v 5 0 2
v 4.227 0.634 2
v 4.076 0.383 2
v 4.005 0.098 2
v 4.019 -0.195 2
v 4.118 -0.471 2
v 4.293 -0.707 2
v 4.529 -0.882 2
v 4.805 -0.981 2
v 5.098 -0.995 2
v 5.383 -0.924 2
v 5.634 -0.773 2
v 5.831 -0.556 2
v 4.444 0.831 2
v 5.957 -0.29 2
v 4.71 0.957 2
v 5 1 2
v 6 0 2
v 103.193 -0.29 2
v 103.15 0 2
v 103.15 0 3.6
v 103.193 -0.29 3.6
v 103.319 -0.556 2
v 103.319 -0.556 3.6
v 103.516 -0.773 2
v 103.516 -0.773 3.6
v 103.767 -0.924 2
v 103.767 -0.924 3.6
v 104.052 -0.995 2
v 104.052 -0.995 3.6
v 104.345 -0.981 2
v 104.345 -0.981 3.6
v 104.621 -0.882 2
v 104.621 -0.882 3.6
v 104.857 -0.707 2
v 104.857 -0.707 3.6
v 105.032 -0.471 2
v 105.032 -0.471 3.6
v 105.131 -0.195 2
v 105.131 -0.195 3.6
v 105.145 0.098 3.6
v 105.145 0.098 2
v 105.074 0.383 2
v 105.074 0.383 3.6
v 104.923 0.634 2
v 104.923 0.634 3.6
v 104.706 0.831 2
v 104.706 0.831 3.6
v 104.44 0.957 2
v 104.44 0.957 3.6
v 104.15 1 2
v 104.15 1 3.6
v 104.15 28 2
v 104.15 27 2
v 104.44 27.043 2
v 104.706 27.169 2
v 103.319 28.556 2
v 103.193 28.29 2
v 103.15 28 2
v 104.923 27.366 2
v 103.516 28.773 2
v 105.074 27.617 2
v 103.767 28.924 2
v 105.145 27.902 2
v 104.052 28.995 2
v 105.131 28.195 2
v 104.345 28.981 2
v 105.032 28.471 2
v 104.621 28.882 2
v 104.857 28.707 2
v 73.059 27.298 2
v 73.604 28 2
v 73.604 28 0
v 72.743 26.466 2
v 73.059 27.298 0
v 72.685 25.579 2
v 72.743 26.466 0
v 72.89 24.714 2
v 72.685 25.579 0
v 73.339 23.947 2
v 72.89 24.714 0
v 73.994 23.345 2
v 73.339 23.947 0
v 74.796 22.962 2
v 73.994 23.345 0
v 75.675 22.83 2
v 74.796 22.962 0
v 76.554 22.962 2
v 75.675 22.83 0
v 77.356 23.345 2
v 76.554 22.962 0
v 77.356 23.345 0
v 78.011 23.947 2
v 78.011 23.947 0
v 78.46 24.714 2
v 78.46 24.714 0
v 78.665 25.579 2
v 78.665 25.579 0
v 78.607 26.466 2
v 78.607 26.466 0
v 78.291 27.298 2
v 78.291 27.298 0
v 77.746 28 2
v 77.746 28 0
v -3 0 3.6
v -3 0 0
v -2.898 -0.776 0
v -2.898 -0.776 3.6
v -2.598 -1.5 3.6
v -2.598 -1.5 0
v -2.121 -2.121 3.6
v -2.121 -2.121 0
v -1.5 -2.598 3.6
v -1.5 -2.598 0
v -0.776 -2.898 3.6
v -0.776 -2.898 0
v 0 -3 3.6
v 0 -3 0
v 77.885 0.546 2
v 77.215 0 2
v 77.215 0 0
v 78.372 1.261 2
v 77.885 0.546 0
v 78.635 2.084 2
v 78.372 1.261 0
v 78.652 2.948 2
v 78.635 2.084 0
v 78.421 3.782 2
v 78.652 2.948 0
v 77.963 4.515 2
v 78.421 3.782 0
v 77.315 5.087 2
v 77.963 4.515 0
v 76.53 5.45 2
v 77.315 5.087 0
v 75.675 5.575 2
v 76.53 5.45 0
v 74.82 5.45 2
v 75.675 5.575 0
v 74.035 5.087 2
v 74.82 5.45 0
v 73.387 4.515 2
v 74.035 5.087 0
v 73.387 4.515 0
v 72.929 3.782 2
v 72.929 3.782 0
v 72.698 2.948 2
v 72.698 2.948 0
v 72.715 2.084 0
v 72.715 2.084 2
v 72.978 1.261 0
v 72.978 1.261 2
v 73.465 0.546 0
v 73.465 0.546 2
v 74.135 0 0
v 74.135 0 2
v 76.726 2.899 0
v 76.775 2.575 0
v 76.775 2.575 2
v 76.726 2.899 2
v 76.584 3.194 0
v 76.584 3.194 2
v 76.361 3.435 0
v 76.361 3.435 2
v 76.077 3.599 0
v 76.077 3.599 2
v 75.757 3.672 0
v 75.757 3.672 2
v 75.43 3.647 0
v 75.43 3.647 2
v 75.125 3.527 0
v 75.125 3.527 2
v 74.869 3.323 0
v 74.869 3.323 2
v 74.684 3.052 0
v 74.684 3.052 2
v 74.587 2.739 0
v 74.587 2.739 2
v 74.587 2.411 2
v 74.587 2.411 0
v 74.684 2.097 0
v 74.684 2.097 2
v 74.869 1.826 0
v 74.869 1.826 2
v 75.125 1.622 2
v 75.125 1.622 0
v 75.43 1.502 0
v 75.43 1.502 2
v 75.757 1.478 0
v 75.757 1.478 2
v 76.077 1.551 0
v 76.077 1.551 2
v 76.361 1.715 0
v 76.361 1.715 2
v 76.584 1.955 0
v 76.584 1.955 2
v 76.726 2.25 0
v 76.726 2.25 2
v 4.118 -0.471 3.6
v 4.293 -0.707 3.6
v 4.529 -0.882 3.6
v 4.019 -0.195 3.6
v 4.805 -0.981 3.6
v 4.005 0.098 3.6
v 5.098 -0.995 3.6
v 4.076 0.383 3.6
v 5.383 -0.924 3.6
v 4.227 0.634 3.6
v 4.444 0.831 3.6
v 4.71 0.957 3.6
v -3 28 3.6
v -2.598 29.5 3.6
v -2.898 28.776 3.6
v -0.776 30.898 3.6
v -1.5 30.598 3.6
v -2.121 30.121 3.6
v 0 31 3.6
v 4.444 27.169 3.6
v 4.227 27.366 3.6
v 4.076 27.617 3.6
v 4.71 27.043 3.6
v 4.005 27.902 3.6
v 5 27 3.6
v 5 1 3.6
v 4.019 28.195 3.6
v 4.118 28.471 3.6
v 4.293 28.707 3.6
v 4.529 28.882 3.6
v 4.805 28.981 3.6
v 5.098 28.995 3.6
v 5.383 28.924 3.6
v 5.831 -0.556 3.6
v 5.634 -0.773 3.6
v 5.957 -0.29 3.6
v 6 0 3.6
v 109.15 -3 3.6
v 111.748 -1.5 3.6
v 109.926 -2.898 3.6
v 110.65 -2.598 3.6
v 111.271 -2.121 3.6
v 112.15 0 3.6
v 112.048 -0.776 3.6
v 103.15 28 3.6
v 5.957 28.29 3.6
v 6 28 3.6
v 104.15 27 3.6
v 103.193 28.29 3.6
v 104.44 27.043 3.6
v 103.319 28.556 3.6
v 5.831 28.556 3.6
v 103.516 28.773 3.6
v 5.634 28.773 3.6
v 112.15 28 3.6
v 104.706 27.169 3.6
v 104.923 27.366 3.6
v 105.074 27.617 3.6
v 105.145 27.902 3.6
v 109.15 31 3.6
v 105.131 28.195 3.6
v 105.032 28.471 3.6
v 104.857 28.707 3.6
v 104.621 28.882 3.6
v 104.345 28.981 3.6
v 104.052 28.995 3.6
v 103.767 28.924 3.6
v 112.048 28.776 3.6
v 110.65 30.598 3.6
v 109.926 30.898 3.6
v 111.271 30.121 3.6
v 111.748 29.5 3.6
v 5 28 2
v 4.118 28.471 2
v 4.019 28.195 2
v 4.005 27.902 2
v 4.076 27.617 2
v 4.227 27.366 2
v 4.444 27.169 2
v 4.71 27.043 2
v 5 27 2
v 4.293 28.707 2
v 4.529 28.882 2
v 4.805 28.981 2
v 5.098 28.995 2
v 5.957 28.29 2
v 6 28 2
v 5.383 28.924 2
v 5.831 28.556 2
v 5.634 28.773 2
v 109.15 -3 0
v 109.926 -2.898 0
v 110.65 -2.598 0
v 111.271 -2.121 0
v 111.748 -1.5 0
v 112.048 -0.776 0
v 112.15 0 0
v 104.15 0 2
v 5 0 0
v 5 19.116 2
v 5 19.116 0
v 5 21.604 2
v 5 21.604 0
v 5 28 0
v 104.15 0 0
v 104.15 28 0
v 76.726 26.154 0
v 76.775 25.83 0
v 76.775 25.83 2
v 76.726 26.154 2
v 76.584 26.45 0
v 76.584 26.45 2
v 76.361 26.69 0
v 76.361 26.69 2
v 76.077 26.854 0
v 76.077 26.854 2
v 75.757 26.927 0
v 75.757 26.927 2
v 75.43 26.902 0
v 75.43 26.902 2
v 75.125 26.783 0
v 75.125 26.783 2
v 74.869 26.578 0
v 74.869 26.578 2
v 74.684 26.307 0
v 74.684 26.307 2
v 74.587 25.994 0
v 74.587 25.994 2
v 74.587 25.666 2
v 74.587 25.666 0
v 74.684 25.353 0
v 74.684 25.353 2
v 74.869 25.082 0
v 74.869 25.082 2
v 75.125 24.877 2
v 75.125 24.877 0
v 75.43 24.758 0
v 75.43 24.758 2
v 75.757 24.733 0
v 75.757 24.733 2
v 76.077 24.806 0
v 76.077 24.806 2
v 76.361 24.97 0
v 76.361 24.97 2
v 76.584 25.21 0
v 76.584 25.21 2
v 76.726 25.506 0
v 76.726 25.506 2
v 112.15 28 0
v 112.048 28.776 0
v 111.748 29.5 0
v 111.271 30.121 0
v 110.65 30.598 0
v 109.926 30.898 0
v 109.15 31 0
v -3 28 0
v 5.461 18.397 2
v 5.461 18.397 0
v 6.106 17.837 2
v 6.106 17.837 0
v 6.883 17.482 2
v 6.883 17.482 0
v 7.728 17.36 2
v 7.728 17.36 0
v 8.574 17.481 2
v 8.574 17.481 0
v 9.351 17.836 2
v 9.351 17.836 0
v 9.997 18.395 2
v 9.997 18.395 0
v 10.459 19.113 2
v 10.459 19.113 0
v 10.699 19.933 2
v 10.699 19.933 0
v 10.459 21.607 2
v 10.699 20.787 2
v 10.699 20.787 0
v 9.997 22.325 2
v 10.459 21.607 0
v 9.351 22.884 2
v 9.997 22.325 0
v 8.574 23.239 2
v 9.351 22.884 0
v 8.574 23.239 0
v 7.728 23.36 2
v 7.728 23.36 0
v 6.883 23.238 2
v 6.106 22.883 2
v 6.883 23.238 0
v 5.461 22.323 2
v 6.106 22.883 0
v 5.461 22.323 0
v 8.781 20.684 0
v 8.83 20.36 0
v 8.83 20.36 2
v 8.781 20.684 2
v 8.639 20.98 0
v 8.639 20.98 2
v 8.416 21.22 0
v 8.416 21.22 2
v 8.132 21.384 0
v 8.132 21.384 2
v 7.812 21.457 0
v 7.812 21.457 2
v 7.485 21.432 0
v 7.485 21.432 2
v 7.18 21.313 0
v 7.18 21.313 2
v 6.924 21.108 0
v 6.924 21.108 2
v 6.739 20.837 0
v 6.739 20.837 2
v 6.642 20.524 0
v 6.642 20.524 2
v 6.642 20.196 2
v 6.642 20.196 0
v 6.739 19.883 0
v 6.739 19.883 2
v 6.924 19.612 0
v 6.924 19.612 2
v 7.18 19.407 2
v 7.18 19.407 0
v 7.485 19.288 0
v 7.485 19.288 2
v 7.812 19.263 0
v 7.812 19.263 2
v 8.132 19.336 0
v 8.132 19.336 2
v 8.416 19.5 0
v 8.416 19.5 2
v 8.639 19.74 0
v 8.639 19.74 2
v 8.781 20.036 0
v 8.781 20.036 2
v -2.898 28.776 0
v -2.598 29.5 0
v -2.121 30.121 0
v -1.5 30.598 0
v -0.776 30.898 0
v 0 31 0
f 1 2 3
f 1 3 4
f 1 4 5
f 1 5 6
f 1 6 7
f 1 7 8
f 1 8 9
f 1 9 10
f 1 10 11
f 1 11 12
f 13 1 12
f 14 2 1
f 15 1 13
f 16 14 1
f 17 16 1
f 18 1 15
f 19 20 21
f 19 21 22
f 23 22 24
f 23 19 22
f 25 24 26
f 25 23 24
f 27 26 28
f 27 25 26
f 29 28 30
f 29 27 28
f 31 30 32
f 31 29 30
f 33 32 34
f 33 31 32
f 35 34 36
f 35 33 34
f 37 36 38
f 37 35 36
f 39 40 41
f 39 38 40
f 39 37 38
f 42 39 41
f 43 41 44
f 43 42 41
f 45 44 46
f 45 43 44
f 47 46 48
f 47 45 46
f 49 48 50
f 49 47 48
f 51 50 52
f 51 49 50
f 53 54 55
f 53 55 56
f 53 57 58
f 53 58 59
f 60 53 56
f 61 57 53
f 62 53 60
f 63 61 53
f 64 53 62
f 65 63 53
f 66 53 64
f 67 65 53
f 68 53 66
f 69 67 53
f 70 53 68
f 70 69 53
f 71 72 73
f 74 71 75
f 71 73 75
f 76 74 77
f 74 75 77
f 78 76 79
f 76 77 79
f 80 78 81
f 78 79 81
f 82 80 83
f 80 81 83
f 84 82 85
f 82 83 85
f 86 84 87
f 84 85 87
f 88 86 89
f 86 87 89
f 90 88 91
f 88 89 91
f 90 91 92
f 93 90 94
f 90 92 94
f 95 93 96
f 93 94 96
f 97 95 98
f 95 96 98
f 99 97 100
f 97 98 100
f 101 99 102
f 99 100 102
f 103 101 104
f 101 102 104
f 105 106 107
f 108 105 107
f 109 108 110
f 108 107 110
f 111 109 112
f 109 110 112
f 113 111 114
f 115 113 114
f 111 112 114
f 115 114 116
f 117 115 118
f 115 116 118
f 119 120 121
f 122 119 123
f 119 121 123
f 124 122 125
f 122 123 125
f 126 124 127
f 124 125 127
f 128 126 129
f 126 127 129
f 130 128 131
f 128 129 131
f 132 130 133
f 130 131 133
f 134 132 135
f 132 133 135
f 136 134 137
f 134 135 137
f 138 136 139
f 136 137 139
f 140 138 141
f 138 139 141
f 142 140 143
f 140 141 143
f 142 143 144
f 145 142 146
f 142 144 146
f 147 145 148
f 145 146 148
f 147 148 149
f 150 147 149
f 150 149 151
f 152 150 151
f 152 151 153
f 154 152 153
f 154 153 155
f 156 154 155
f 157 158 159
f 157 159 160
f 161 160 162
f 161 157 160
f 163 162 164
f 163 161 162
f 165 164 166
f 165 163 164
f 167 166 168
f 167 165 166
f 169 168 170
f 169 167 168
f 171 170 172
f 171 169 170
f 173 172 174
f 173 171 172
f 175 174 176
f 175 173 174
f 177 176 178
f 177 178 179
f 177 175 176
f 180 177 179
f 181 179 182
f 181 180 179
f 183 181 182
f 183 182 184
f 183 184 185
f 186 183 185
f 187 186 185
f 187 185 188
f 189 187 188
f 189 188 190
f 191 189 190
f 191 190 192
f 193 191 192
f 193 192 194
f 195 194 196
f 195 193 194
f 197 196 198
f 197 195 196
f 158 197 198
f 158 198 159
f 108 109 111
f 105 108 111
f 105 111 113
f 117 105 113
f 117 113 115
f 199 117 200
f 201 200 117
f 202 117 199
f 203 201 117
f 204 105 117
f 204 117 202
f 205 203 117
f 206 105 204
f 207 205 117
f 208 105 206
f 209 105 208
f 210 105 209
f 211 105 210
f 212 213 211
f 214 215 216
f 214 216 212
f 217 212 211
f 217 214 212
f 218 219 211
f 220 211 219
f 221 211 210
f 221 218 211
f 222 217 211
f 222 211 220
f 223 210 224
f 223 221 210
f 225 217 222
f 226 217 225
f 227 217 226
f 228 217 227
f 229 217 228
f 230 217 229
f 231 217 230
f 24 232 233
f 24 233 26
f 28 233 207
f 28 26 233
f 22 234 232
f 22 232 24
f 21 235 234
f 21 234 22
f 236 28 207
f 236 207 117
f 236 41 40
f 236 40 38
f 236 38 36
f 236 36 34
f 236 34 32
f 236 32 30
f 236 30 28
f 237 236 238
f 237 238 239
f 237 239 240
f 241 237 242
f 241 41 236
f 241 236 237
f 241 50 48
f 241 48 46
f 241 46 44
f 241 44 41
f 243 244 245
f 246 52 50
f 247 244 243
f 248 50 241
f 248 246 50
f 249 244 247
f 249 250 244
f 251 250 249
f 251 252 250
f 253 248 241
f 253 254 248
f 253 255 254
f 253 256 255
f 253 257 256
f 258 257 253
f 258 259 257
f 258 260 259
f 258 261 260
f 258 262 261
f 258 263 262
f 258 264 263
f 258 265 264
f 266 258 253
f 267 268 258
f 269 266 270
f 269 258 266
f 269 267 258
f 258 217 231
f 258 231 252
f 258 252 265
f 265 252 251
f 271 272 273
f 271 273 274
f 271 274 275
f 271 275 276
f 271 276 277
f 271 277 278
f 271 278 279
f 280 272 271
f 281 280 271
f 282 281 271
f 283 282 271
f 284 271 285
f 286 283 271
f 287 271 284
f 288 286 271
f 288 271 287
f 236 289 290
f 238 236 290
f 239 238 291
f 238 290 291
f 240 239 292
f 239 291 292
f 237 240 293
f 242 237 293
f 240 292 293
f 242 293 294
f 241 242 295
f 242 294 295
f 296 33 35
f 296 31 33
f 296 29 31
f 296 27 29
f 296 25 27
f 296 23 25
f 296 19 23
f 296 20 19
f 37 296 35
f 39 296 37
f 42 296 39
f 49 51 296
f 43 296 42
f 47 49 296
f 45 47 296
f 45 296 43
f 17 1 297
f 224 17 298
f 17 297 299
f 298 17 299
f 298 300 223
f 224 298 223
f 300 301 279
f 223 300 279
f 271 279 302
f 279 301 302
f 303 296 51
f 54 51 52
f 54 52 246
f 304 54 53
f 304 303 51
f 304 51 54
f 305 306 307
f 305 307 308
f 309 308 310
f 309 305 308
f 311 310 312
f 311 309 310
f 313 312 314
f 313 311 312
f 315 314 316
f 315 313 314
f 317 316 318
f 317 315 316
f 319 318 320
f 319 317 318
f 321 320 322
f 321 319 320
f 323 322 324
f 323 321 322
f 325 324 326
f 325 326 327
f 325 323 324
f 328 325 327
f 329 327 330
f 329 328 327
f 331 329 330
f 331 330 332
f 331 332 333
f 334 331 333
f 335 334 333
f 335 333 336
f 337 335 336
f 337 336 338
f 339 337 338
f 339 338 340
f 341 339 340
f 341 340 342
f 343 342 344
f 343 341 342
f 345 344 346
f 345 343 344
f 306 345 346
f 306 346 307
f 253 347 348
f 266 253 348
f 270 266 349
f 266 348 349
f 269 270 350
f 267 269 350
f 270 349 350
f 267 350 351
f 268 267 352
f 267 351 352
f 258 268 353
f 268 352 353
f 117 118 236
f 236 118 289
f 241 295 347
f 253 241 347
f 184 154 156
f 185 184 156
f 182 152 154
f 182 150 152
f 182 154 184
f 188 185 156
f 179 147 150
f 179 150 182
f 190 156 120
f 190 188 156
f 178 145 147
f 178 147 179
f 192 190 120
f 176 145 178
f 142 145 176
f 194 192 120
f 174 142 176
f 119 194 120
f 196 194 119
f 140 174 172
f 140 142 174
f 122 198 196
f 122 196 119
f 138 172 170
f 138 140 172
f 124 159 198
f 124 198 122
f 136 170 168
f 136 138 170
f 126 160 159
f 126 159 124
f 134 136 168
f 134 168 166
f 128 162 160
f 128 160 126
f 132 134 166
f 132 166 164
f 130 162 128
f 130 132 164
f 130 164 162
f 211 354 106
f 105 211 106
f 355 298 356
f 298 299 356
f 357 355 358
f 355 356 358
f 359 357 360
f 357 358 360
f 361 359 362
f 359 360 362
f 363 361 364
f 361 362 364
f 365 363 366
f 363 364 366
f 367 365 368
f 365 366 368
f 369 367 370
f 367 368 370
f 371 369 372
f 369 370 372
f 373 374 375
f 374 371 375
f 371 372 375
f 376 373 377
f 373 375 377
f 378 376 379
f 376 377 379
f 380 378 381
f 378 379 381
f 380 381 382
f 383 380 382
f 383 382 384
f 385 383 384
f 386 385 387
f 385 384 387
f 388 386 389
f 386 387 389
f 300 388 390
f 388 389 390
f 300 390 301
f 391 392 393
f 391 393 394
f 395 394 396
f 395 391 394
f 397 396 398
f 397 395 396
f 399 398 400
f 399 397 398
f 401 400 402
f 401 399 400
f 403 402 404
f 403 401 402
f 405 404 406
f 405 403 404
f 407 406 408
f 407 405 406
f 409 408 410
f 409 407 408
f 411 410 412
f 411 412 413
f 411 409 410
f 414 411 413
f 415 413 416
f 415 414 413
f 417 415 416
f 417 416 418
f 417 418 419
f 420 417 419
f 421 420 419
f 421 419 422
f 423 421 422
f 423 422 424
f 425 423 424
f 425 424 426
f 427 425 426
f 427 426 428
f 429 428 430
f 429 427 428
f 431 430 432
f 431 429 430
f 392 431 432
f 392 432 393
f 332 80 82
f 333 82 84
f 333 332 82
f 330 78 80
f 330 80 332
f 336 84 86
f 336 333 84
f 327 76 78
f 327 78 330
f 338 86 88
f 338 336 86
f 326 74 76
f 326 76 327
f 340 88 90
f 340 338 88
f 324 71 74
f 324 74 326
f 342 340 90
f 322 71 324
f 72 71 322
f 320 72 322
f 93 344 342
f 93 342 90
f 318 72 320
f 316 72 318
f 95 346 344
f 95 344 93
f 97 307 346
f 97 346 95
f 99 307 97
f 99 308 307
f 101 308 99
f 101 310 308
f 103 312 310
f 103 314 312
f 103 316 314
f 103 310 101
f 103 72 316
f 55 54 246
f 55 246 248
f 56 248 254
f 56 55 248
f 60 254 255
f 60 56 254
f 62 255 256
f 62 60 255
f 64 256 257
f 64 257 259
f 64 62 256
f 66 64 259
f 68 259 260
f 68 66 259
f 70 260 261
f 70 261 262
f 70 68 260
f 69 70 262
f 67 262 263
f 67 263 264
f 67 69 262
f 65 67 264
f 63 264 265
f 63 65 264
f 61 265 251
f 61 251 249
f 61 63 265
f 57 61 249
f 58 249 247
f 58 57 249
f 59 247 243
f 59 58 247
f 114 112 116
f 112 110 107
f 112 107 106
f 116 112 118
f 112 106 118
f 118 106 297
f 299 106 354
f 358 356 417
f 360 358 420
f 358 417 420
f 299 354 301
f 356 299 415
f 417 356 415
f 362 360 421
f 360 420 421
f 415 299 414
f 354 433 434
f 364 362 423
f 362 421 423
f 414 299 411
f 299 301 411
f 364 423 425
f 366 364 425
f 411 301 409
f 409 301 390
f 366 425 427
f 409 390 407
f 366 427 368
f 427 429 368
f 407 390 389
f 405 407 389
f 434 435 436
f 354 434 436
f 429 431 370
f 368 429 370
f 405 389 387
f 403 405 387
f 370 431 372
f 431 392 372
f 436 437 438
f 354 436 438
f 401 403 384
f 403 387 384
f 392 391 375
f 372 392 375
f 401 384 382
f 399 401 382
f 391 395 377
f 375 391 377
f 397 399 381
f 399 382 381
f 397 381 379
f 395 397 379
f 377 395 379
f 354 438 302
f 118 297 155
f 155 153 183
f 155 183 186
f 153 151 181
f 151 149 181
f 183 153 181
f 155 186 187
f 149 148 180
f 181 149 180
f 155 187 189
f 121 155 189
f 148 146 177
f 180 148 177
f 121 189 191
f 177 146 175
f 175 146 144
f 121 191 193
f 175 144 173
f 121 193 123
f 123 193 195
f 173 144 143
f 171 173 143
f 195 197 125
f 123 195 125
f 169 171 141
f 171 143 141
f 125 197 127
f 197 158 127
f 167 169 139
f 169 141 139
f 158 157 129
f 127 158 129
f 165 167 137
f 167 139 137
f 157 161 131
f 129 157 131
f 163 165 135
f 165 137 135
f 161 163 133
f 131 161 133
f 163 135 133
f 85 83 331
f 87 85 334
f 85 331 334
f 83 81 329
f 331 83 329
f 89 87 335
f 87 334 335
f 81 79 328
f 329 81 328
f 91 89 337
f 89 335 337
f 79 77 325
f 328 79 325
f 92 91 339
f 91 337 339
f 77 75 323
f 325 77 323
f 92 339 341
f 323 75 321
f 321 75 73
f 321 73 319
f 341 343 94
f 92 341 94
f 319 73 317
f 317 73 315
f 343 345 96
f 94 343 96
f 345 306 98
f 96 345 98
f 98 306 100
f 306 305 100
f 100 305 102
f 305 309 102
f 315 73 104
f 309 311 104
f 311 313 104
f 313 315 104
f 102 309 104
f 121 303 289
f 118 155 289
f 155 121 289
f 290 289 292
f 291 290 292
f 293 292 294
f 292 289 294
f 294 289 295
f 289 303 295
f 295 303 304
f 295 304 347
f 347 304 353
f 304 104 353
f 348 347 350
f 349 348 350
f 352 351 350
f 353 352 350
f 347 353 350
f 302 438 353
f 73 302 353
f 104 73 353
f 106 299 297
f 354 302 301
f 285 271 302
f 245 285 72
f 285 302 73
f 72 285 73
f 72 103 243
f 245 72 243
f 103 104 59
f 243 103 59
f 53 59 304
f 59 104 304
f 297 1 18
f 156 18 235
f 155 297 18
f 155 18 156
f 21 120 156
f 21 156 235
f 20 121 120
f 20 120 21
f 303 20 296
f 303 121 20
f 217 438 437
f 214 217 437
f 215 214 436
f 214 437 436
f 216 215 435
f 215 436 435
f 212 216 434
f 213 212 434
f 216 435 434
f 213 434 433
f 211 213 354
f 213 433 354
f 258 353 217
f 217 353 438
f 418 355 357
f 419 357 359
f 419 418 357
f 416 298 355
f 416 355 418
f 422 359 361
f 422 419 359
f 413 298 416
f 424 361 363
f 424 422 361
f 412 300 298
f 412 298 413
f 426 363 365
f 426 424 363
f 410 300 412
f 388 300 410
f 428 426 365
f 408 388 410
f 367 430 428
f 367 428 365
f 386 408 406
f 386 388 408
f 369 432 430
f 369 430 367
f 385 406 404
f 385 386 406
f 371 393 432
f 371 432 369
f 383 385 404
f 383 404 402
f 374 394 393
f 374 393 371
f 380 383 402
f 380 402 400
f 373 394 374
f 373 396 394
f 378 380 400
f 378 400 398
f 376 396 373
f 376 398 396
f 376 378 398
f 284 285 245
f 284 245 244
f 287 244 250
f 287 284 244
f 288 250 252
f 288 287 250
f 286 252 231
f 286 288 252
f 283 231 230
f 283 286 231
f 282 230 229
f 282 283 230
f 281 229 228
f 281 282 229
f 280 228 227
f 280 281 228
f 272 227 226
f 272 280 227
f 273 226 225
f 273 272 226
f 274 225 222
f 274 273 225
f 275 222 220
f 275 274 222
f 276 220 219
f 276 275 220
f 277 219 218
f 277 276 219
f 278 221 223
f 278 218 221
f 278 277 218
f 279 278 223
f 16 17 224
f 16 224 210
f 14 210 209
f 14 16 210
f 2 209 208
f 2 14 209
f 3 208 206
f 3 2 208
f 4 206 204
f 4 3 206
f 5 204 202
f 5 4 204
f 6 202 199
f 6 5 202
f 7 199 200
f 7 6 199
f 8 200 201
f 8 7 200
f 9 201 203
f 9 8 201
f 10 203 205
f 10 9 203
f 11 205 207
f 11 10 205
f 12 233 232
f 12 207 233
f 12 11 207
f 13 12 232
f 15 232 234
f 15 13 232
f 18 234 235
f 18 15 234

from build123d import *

# Parameters (mm, degrees)
SKETCH010_W     = 99.15
SKETCH010_H     = 28
PAD005_DEPTH    = 3.6
SKETCH011_R     = 3
SKETCH011_R_2   = 1.1
PAD006_DEPTH    = 2
SKETCH015_R     = 1
POCKET002_DEPTH = 5


with BuildPart() as part:
    # Sketch010 → Pad005 (new body)
    with BuildSketch(Plane.XY):
        with BuildLine():
            Line((0, -3), (109.15, -3))
            ThreePointArc((109.15, -3), (111.27132, -2.12132), (112.15, 0))
            Line((112.15, 0), (112.15, 28))
            ThreePointArc((112.15, 28), (111.27132, 30.12132), (109.15, 31))
            Line((109.15, 31), (0, 31))
            ThreePointArc((0, 31), (-2.12132, 30.12132), (-3, 28))
            Line((-3, 28), (-3, 0))
            ThreePointArc((-3, 0), (-2.12132, -2.12132), (0, -3))
        make_face()
        with Locations((54.575, 14)):
            Rectangle(SKETCH010_W, SKETCH010_H, mode=Mode.SUBTRACT)
    extrude(amount=PAD005_DEPTH)

    # Sketch011 → Pad006 (join)
    with BuildSketch(Plane.XY):
        with Locations((75.675, 25.83)):
            Circle(SKETCH011_R)
        with Locations((75.675, 25.83)):
            Circle(SKETCH011_R_2, mode=Mode.SUBTRACT)
        with Locations((75.675, 2.5746)):
            Circle(SKETCH011_R)
        with Locations((75.675, 2.5746)):
            Circle(SKETCH011_R_2, mode=Mode.SUBTRACT)
        with Locations((7.73, 20.36)):
            Circle(SKETCH011_R)
        with Locations((7.73, 20.36)):
            Circle(SKETCH011_R_2, mode=Mode.SUBTRACT)
    extrude(amount=PAD006_DEPTH)

    # Sketch015 → Pocket002 (cut)
    with BuildSketch(Plane.XY.offset(2)):
        with Locations((5, 28)):
            Circle(SKETCH015_R)
        with Locations((104.15, 28)):
            Circle(SKETCH015_R)
        with Locations((104.15, 0)):
            Circle(SKETCH015_R)
        with Locations((5, 0)):
            Circle(SKETCH015_R)
    extrude(amount=POCKET002_DEPTH, mode=Mode.SUBTRACT)


solid = part.part
